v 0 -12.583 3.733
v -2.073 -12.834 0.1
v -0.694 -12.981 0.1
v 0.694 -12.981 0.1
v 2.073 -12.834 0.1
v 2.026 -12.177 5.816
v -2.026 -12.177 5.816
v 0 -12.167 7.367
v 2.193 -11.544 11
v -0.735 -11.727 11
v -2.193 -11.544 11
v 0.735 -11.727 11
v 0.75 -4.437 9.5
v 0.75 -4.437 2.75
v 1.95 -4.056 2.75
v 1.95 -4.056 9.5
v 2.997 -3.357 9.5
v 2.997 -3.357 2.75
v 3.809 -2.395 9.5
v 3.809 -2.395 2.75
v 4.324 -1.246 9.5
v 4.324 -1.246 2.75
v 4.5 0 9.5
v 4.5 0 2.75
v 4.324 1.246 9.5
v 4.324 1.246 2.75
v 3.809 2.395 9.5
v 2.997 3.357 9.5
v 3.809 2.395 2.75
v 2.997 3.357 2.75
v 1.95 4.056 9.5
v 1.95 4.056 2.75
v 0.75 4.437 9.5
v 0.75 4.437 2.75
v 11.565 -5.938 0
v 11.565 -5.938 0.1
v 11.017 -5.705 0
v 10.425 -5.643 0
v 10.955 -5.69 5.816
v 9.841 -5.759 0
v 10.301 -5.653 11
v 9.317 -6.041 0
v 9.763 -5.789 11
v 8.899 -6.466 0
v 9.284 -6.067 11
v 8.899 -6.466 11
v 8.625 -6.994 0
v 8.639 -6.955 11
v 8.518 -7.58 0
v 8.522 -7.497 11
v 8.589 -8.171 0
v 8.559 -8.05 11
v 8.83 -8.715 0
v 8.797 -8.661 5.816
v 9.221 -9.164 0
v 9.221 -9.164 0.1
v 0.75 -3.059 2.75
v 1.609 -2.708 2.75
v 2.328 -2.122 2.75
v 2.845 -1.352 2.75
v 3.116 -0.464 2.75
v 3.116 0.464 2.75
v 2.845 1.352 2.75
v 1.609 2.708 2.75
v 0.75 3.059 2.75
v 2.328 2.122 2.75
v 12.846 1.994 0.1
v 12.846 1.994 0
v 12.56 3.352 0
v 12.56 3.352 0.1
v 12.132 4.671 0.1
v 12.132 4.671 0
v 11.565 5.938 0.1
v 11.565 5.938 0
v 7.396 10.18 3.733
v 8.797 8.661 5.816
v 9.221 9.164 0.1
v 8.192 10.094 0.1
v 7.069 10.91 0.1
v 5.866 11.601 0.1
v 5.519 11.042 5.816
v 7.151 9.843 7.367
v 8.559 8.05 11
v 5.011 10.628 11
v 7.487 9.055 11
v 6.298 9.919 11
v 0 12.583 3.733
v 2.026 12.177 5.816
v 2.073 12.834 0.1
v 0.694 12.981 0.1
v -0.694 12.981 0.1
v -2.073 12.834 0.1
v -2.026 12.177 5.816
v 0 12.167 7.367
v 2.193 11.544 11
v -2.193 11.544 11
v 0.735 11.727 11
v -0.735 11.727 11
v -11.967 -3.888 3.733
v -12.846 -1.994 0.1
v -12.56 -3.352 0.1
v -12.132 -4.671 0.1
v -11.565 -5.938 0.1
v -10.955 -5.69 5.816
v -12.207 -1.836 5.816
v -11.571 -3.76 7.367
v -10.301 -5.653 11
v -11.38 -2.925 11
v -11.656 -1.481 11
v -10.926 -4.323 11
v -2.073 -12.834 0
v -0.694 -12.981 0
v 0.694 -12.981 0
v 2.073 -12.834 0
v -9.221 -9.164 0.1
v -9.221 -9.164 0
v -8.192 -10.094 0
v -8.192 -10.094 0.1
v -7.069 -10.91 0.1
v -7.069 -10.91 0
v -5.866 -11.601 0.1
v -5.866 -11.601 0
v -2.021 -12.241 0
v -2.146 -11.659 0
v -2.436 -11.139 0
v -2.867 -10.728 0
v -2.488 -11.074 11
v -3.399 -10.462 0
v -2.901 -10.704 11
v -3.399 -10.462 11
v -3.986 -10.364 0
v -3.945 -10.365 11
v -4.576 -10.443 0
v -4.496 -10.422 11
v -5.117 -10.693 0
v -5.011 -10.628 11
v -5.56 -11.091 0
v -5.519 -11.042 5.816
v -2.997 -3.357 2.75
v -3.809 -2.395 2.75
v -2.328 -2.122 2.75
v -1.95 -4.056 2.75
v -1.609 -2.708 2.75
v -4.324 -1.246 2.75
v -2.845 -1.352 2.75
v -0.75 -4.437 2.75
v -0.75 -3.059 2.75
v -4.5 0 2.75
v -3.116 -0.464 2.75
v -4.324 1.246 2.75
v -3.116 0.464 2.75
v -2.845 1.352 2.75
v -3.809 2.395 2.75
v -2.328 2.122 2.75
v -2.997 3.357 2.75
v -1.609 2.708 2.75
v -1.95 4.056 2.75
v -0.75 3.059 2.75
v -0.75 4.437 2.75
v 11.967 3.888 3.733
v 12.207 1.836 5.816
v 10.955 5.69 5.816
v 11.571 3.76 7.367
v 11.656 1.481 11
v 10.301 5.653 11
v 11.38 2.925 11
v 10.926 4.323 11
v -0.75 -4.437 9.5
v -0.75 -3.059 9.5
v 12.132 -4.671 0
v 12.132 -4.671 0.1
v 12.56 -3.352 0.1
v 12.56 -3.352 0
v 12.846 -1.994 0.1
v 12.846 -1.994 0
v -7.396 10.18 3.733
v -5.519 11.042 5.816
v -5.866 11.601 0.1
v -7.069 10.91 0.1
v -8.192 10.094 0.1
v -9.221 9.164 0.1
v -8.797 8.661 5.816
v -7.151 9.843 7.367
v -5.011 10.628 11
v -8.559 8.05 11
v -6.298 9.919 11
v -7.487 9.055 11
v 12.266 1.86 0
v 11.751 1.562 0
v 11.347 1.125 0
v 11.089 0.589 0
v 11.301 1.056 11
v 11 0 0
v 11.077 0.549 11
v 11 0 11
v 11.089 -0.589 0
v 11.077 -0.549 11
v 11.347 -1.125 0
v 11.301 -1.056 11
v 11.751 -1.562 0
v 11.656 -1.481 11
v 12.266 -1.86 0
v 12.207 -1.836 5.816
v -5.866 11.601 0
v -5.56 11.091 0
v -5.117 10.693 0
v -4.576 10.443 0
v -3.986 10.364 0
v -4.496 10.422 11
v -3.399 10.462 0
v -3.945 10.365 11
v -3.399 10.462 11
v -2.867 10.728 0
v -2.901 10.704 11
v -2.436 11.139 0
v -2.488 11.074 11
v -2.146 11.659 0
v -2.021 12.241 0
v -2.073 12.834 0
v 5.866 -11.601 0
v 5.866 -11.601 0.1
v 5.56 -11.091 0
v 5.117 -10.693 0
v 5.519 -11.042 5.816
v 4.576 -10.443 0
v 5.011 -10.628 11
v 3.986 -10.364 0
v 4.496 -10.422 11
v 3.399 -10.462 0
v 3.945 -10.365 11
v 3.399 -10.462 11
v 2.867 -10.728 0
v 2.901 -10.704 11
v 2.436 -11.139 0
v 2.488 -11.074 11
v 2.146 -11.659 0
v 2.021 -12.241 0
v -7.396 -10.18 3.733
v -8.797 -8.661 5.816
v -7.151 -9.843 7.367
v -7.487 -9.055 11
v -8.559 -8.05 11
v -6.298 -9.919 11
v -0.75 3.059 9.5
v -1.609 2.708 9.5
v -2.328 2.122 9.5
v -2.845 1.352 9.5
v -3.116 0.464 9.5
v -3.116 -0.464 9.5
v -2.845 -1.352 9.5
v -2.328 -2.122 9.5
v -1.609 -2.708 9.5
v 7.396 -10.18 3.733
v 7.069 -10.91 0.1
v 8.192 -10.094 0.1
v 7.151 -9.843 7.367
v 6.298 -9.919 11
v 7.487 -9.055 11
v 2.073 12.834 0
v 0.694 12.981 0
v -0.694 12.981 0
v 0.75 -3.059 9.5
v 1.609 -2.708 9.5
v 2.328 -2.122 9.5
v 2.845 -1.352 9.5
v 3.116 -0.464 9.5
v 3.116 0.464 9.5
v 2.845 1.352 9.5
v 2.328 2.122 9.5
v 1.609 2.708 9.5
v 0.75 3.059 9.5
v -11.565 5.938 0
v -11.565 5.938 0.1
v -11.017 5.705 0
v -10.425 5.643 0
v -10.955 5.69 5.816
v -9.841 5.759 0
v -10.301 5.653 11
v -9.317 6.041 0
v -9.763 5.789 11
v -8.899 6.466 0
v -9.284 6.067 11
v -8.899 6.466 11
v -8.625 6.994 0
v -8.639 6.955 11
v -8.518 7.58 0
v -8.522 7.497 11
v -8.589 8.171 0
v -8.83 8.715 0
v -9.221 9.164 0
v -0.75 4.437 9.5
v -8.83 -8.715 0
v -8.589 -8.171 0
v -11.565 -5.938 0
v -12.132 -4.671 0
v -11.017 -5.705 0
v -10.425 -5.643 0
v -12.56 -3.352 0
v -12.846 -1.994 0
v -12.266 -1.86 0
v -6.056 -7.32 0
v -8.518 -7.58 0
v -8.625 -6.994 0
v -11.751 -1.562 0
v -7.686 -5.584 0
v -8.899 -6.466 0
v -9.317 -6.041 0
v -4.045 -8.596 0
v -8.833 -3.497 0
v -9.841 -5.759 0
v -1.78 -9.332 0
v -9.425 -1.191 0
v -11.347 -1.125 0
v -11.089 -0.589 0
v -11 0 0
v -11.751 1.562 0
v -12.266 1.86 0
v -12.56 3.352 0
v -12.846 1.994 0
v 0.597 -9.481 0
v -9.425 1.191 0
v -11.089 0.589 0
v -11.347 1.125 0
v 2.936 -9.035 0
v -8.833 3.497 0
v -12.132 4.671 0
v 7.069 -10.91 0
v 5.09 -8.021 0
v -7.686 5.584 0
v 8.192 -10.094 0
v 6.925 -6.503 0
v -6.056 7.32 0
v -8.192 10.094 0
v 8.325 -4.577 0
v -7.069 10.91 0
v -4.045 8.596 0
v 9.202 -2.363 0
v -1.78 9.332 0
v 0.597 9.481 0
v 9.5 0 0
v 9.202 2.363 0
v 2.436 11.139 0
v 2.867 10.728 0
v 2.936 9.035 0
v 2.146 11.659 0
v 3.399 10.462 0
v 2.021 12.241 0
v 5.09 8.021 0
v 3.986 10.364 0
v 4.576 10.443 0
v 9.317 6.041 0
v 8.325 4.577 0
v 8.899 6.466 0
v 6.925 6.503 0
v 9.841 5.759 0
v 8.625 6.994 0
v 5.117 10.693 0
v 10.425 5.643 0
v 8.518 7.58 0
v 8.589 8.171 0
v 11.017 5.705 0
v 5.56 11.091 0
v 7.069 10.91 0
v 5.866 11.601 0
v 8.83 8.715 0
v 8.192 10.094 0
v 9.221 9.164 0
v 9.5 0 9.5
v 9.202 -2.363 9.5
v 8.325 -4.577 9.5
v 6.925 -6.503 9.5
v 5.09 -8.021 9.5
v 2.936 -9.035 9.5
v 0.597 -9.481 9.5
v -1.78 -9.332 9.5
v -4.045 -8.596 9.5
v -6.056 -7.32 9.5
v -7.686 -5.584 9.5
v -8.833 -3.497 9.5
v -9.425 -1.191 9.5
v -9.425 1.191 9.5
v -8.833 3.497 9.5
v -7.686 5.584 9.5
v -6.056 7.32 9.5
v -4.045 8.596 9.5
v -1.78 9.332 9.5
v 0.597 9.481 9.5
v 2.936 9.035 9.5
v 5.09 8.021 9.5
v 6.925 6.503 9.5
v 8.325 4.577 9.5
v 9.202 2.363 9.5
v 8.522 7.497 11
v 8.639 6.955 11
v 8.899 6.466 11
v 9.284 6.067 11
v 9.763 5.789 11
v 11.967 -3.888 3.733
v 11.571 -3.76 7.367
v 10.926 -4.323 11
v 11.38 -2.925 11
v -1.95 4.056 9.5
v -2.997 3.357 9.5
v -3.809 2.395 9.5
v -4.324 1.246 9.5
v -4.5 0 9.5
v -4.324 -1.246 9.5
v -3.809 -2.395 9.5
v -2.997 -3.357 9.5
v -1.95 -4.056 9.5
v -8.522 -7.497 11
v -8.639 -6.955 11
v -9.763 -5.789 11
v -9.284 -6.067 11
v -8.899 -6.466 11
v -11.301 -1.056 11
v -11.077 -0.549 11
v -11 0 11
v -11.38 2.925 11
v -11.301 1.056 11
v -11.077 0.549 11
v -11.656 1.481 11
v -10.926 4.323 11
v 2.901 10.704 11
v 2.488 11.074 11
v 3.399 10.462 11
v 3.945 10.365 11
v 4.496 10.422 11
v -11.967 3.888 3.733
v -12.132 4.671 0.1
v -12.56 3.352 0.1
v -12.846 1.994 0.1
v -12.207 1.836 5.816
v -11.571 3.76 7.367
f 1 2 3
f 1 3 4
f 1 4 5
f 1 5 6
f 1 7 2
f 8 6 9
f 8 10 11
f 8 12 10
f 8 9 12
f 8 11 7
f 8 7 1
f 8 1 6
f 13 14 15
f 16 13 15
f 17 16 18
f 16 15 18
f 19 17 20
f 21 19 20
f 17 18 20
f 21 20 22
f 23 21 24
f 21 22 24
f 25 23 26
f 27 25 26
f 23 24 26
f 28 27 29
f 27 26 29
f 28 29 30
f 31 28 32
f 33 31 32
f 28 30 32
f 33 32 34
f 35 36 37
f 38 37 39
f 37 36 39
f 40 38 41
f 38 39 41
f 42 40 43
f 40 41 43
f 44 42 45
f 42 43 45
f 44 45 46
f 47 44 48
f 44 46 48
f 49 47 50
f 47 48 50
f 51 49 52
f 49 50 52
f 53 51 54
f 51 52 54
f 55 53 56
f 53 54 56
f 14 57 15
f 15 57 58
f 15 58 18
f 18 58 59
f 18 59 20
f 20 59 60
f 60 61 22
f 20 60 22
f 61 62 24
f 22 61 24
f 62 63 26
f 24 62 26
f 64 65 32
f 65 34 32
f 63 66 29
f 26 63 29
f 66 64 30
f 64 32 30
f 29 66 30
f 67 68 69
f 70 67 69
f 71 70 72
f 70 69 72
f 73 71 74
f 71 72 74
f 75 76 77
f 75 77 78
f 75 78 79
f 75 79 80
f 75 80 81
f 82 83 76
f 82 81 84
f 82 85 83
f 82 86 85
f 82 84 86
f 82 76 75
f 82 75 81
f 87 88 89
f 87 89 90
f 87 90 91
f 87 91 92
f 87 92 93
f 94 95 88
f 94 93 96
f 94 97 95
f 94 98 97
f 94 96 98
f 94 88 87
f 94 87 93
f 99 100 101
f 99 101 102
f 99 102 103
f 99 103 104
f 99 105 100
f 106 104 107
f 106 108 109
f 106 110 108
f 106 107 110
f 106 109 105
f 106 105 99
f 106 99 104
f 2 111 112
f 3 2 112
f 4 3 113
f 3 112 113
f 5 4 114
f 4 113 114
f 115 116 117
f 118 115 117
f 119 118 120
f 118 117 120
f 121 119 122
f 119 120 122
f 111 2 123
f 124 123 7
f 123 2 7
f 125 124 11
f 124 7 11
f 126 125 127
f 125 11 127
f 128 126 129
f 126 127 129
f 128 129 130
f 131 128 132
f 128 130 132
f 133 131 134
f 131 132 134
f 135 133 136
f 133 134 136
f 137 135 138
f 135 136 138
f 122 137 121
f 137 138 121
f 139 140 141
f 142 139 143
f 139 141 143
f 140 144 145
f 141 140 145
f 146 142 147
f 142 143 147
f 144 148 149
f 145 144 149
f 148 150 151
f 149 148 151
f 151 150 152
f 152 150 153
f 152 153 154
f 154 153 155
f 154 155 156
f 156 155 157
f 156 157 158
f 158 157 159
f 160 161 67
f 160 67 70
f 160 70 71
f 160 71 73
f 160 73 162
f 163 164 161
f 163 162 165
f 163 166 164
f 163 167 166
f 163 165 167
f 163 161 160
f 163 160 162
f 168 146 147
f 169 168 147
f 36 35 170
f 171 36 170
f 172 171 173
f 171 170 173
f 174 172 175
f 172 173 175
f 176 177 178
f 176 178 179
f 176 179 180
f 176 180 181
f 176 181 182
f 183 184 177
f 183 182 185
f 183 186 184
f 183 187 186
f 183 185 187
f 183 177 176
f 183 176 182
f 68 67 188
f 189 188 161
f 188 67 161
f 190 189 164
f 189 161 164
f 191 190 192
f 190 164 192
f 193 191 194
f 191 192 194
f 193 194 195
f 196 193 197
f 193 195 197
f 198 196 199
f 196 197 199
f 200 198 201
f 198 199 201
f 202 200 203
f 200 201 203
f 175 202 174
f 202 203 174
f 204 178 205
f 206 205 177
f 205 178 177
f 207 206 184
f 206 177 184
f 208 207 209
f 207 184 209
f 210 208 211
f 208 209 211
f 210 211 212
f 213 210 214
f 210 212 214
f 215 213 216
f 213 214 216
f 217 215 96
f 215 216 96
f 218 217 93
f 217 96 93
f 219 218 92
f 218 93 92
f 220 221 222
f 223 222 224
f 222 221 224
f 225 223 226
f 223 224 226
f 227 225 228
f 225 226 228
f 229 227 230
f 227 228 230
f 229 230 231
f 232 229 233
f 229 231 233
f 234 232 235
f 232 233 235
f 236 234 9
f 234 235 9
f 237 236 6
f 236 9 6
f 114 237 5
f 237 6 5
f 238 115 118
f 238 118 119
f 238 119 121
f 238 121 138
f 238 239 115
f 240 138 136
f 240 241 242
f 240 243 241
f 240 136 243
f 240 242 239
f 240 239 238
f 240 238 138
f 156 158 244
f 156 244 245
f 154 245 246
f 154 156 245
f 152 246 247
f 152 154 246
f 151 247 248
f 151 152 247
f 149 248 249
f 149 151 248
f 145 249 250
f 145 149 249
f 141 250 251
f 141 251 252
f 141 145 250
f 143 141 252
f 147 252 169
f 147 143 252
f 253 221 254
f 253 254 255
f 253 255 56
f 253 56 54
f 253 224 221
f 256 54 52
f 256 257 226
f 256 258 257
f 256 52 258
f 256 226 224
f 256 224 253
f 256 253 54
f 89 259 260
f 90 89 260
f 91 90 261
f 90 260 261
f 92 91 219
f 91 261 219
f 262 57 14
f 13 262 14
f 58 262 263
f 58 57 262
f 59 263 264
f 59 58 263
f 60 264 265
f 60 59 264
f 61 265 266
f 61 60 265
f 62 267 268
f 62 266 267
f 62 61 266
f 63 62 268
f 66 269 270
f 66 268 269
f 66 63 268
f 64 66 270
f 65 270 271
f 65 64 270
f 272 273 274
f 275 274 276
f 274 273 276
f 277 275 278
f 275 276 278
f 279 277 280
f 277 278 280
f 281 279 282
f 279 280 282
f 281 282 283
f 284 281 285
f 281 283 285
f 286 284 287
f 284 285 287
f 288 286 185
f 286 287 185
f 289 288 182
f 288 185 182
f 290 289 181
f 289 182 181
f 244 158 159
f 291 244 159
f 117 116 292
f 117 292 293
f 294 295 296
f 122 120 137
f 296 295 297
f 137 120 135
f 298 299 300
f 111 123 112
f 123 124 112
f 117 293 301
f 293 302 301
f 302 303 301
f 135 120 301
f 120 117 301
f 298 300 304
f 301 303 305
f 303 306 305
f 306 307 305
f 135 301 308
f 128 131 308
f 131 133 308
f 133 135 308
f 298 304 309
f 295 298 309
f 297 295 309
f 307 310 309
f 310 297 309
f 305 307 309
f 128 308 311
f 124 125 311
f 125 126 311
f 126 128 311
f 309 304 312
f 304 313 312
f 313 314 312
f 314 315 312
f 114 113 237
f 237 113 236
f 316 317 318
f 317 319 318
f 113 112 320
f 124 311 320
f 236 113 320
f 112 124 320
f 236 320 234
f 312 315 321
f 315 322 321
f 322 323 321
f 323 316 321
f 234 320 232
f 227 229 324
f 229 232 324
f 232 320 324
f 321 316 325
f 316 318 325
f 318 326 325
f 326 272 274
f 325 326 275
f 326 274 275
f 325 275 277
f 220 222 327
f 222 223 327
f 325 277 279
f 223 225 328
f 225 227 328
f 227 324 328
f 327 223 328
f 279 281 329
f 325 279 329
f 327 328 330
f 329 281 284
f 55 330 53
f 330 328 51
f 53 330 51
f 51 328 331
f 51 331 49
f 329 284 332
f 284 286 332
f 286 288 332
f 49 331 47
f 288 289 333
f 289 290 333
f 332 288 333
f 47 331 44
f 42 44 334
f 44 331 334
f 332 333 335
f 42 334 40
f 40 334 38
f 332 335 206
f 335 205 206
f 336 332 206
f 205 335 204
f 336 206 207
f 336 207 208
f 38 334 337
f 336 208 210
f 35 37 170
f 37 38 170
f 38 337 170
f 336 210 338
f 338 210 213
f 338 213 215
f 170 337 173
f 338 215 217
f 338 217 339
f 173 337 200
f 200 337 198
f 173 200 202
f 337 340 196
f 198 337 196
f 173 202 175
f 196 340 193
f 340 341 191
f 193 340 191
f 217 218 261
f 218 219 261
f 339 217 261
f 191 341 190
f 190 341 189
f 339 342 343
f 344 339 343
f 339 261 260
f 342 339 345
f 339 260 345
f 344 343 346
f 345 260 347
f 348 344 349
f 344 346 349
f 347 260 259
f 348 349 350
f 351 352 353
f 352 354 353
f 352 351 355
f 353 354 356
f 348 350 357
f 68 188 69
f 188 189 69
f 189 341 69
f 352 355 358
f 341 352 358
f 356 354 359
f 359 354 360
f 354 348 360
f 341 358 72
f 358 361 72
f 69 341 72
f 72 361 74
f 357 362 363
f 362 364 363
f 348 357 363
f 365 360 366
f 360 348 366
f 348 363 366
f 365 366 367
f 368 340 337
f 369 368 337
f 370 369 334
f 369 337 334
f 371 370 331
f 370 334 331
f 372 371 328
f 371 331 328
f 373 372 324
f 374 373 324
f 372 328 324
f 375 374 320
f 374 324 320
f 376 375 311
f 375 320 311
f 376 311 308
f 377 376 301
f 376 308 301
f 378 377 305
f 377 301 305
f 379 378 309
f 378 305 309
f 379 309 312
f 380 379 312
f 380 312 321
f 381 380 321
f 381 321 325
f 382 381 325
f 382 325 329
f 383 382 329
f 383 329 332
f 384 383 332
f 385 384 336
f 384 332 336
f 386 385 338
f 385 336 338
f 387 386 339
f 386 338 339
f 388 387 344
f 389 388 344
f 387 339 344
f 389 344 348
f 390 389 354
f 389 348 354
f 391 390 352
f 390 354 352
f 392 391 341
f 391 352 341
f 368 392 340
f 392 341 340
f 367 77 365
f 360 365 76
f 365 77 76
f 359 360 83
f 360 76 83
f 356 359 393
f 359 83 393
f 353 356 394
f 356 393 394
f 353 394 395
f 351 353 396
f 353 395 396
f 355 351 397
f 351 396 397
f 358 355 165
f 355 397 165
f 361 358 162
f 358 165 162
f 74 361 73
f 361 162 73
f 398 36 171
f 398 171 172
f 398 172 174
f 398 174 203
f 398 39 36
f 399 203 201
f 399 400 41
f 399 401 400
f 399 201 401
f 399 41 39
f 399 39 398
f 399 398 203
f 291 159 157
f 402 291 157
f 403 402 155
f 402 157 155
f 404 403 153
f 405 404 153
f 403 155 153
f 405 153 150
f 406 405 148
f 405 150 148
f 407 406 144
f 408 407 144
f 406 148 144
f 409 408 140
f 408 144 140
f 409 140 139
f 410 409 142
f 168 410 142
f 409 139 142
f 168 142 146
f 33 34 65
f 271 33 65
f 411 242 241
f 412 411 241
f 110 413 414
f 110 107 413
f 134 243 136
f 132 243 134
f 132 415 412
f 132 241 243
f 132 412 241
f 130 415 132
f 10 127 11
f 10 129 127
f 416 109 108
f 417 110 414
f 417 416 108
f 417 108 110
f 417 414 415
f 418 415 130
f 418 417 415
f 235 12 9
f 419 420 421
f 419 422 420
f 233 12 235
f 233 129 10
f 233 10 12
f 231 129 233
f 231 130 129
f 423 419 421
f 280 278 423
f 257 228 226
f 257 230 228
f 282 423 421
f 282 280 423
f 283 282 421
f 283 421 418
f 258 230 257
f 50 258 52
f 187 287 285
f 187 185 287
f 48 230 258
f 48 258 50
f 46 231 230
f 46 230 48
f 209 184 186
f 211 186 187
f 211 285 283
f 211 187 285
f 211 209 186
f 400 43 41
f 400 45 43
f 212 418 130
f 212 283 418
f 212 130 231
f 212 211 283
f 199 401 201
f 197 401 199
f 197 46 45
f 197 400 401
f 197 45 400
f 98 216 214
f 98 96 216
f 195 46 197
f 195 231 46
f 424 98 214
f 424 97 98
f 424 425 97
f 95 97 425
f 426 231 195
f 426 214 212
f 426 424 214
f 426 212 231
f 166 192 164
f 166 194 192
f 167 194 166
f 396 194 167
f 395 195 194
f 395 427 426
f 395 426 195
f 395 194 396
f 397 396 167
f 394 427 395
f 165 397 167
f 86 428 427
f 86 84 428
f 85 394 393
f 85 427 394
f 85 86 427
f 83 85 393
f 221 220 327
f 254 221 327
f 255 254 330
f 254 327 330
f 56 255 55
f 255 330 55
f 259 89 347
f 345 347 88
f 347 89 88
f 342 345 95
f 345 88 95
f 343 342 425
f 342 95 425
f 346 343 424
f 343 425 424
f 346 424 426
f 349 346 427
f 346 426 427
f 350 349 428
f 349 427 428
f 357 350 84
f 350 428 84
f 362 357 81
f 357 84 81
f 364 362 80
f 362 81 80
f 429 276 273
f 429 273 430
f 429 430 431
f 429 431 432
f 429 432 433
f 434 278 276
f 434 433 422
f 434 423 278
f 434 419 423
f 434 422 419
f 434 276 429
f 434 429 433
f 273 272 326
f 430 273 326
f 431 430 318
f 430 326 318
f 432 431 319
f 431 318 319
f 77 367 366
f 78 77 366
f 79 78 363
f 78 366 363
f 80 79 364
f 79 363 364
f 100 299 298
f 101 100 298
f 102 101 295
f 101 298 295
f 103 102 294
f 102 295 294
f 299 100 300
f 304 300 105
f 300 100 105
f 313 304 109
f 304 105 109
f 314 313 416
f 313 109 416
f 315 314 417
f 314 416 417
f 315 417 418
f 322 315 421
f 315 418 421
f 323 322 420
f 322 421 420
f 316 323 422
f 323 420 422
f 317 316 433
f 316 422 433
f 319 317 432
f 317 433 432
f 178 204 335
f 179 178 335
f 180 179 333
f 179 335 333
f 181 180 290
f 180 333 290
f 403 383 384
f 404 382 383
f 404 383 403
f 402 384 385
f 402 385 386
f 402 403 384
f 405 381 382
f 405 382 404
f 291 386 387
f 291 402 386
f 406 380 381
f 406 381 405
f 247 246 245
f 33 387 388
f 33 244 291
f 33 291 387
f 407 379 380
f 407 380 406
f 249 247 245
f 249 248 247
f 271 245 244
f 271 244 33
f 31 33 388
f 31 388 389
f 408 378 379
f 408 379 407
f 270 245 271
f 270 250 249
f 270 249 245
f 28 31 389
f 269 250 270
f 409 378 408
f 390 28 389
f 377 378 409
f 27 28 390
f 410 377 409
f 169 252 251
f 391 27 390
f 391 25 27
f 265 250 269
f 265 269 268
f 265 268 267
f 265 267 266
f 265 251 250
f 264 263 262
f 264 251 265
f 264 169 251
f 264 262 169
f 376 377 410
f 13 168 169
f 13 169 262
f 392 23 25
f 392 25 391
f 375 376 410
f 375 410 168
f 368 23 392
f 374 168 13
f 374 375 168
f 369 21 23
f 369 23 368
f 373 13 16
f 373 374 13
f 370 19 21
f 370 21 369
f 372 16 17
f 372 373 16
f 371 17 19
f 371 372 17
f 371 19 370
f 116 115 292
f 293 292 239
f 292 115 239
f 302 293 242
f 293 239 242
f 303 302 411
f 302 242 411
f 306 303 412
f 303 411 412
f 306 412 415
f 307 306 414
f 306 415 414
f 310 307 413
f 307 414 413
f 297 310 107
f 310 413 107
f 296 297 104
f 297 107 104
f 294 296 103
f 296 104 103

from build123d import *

# Parameters (mm, degrees)
F0_R      = 13
F0_R_2    = 11.75
F0_R_3    = 3.15
F3_DEPTH  = 0.1
F3_FACE_R = 13
F2_R      = 11.75
F5_DEPTH  = 9.5
F6_R      = 2
F7_DEPTH  = 25
F8_DEPTH  = 11.0010001
F9_R      = 9.5
F10_DEPTH = 9.5
F11_DEPTH = 2.75


with BuildPart() as f3:
    # F0 (on Top) → F3 (new body)
    with BuildSketch(Plane.XY):
        Circle(F0_R)
        Circle(F0_R_2, mode=Mode.SUBTRACT)
        Circle(F0_R_2)
        Circle(F0_R_3, mode=Mode.SUBTRACT)
        Circle(F0_R_3)
    extrude(amount=F3_DEPTH)

    # F3_face (on face) → F4 section 0
    with BuildSketch(Plane.XY.offset(0.1)):
        Circle(F3_FACE_R)
    # F2 (on offset) → F4 section 1
    with BuildSketch(Plane.XY.offset(11)):
        Circle(F2_R)
    loft()

    # F0 (on Top) → F5 (cut)
    with BuildSketch(Plane.XY):
        Circle(F0_R_3)
    extrude(amount=F5_DEPTH, mode=Mode.SUBTRACT)

    # F6 (on face) → F7 (cut)
    with BuildSketch(Plane.XY.offset(11)):
        with Locations((13, 0)):
            Circle(F6_R)
        with Locations((10.5172209269, 7.6412082798)):
            Circle(F6_R)
        with Locations((4.0172209269, 12.3637347118)):
            Circle(F6_R)
        with Locations((-4.0172209269, 12.3637347118)):
            Circle(F6_R)
        with Locations((-10.5172209269, 7.6412082798)):
            Circle(F6_R)
        with Locations((-13, 0)):
            Circle(F6_R)
        with Locations((-10.5172209269, -7.6412082798)):
            Circle(F6_R)
        with Locations((-4.0172209269, -12.3637347118)):
            Circle(F6_R)
        with Locations((4.0172209269, -12.3637347118)):
            Circle(F6_R)
        with Locations((10.5172209269, -7.6412082798)):
            Circle(F6_R)
    extrude(amount=-F7_DEPTH, mode=Mode.SUBTRACT)

    # F6 (on face) → F8 (cut, through all)
    with BuildSketch(Plane.XY.offset(11)):
        with Locations((13, 0)):
            Circle(F6_R)
        with Locations((10.5172209269, 7.6412082798)):
            Circle(F6_R)
        with Locations((4.0172209269, 12.3637347118)):
            Circle(F6_R)
        with Locations((-4.0172209269, 12.3637347118)):
            Circle(F6_R)
        with Locations((-10.5172209269, 7.6412082798)):
            Circle(F6_R)
        with Locations((-13, 0)):
            Circle(F6_R)
        with Locations((-10.5172209269, -7.6412082798)):
            Circle(F6_R)
        with Locations((-4.0172209269, -12.3637347118)):
            Circle(F6_R)
        with Locations((4.0172209269, -12.3637347118)):
            Circle(F6_R)
        with Locations((10.5172209269, -7.6412082798)):
            Circle(F6_R)
    extrude(amount=-F8_DEPTH, mode=Mode.SUBTRACT)

    # F9 (on face) → F10 (cut)
    with BuildSketch(Plane(origin=(0, 0, 0), x_dir=(1, 0, 0), z_dir=(0, 0, -1))):
        Circle(F9_R)
        with BuildLine():
            ThreePointArc((0.75, 4.4370598373), (4.5, 0), (0.75, -4.4370598373))
            Line((0.75, -4.4370598373), (0.75, -3.0594117082))
            ThreePointArc((0.75, -3.0594117082), (0, -3.15), (-0.75, -3.0594117082))
            Line((-0.75, -3.0594117082), (-0.75, -4.4370598373))
            ThreePointArc((-0.75, -4.4370598373), (-4.5, 0), (-0.75, 4.4370598373))
            Line((-0.75, 4.4370598373), (-0.75, 3.0594117082))
            ThreePointArc((-0.75, 3.0594117082), (0, 3.15), (0.75, 3.0594117082))
            Line((0.75, 3.0594117082), (0.75, 4.4370598373))
        make_face(mode=Mode.SUBTRACT)
    extrude(amount=-F10_DEPTH, mode=Mode.SUBTRACT)

    # F11 (cut): faces of the model
    f11_faces = [f3.faces().sort_by_distance(p)[0] for p in [
        (-3.2463392443, 0, 0),
        (0.8463392443, 3.7482357727, 0),
    ]]
    extrude(f11_faces, amount=-F11_DEPTH, mode=Mode.SUBTRACT)


solid = f3.part
